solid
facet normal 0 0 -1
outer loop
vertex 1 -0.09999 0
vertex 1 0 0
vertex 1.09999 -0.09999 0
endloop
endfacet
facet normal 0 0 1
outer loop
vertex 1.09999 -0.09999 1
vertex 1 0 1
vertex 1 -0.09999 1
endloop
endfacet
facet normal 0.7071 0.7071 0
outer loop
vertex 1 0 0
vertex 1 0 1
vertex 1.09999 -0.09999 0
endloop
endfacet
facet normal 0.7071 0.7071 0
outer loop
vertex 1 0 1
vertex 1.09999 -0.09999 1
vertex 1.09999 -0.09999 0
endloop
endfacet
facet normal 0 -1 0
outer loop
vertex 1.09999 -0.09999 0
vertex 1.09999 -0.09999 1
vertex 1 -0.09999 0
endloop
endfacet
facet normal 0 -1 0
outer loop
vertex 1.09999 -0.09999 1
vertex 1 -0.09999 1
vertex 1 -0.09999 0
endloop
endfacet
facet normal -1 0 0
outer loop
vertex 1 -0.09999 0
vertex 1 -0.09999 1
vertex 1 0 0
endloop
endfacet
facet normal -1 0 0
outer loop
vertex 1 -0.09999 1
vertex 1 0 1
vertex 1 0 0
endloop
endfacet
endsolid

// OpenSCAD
translate([1,0,0])
scale([-1,1,1])
rotate([0,0,0])
linear_extrude(1, false, convexity=1, twist=0, slices=1) {
    polygon([[0, 0], [-.1, -.1], [0, -.1]]);
}
